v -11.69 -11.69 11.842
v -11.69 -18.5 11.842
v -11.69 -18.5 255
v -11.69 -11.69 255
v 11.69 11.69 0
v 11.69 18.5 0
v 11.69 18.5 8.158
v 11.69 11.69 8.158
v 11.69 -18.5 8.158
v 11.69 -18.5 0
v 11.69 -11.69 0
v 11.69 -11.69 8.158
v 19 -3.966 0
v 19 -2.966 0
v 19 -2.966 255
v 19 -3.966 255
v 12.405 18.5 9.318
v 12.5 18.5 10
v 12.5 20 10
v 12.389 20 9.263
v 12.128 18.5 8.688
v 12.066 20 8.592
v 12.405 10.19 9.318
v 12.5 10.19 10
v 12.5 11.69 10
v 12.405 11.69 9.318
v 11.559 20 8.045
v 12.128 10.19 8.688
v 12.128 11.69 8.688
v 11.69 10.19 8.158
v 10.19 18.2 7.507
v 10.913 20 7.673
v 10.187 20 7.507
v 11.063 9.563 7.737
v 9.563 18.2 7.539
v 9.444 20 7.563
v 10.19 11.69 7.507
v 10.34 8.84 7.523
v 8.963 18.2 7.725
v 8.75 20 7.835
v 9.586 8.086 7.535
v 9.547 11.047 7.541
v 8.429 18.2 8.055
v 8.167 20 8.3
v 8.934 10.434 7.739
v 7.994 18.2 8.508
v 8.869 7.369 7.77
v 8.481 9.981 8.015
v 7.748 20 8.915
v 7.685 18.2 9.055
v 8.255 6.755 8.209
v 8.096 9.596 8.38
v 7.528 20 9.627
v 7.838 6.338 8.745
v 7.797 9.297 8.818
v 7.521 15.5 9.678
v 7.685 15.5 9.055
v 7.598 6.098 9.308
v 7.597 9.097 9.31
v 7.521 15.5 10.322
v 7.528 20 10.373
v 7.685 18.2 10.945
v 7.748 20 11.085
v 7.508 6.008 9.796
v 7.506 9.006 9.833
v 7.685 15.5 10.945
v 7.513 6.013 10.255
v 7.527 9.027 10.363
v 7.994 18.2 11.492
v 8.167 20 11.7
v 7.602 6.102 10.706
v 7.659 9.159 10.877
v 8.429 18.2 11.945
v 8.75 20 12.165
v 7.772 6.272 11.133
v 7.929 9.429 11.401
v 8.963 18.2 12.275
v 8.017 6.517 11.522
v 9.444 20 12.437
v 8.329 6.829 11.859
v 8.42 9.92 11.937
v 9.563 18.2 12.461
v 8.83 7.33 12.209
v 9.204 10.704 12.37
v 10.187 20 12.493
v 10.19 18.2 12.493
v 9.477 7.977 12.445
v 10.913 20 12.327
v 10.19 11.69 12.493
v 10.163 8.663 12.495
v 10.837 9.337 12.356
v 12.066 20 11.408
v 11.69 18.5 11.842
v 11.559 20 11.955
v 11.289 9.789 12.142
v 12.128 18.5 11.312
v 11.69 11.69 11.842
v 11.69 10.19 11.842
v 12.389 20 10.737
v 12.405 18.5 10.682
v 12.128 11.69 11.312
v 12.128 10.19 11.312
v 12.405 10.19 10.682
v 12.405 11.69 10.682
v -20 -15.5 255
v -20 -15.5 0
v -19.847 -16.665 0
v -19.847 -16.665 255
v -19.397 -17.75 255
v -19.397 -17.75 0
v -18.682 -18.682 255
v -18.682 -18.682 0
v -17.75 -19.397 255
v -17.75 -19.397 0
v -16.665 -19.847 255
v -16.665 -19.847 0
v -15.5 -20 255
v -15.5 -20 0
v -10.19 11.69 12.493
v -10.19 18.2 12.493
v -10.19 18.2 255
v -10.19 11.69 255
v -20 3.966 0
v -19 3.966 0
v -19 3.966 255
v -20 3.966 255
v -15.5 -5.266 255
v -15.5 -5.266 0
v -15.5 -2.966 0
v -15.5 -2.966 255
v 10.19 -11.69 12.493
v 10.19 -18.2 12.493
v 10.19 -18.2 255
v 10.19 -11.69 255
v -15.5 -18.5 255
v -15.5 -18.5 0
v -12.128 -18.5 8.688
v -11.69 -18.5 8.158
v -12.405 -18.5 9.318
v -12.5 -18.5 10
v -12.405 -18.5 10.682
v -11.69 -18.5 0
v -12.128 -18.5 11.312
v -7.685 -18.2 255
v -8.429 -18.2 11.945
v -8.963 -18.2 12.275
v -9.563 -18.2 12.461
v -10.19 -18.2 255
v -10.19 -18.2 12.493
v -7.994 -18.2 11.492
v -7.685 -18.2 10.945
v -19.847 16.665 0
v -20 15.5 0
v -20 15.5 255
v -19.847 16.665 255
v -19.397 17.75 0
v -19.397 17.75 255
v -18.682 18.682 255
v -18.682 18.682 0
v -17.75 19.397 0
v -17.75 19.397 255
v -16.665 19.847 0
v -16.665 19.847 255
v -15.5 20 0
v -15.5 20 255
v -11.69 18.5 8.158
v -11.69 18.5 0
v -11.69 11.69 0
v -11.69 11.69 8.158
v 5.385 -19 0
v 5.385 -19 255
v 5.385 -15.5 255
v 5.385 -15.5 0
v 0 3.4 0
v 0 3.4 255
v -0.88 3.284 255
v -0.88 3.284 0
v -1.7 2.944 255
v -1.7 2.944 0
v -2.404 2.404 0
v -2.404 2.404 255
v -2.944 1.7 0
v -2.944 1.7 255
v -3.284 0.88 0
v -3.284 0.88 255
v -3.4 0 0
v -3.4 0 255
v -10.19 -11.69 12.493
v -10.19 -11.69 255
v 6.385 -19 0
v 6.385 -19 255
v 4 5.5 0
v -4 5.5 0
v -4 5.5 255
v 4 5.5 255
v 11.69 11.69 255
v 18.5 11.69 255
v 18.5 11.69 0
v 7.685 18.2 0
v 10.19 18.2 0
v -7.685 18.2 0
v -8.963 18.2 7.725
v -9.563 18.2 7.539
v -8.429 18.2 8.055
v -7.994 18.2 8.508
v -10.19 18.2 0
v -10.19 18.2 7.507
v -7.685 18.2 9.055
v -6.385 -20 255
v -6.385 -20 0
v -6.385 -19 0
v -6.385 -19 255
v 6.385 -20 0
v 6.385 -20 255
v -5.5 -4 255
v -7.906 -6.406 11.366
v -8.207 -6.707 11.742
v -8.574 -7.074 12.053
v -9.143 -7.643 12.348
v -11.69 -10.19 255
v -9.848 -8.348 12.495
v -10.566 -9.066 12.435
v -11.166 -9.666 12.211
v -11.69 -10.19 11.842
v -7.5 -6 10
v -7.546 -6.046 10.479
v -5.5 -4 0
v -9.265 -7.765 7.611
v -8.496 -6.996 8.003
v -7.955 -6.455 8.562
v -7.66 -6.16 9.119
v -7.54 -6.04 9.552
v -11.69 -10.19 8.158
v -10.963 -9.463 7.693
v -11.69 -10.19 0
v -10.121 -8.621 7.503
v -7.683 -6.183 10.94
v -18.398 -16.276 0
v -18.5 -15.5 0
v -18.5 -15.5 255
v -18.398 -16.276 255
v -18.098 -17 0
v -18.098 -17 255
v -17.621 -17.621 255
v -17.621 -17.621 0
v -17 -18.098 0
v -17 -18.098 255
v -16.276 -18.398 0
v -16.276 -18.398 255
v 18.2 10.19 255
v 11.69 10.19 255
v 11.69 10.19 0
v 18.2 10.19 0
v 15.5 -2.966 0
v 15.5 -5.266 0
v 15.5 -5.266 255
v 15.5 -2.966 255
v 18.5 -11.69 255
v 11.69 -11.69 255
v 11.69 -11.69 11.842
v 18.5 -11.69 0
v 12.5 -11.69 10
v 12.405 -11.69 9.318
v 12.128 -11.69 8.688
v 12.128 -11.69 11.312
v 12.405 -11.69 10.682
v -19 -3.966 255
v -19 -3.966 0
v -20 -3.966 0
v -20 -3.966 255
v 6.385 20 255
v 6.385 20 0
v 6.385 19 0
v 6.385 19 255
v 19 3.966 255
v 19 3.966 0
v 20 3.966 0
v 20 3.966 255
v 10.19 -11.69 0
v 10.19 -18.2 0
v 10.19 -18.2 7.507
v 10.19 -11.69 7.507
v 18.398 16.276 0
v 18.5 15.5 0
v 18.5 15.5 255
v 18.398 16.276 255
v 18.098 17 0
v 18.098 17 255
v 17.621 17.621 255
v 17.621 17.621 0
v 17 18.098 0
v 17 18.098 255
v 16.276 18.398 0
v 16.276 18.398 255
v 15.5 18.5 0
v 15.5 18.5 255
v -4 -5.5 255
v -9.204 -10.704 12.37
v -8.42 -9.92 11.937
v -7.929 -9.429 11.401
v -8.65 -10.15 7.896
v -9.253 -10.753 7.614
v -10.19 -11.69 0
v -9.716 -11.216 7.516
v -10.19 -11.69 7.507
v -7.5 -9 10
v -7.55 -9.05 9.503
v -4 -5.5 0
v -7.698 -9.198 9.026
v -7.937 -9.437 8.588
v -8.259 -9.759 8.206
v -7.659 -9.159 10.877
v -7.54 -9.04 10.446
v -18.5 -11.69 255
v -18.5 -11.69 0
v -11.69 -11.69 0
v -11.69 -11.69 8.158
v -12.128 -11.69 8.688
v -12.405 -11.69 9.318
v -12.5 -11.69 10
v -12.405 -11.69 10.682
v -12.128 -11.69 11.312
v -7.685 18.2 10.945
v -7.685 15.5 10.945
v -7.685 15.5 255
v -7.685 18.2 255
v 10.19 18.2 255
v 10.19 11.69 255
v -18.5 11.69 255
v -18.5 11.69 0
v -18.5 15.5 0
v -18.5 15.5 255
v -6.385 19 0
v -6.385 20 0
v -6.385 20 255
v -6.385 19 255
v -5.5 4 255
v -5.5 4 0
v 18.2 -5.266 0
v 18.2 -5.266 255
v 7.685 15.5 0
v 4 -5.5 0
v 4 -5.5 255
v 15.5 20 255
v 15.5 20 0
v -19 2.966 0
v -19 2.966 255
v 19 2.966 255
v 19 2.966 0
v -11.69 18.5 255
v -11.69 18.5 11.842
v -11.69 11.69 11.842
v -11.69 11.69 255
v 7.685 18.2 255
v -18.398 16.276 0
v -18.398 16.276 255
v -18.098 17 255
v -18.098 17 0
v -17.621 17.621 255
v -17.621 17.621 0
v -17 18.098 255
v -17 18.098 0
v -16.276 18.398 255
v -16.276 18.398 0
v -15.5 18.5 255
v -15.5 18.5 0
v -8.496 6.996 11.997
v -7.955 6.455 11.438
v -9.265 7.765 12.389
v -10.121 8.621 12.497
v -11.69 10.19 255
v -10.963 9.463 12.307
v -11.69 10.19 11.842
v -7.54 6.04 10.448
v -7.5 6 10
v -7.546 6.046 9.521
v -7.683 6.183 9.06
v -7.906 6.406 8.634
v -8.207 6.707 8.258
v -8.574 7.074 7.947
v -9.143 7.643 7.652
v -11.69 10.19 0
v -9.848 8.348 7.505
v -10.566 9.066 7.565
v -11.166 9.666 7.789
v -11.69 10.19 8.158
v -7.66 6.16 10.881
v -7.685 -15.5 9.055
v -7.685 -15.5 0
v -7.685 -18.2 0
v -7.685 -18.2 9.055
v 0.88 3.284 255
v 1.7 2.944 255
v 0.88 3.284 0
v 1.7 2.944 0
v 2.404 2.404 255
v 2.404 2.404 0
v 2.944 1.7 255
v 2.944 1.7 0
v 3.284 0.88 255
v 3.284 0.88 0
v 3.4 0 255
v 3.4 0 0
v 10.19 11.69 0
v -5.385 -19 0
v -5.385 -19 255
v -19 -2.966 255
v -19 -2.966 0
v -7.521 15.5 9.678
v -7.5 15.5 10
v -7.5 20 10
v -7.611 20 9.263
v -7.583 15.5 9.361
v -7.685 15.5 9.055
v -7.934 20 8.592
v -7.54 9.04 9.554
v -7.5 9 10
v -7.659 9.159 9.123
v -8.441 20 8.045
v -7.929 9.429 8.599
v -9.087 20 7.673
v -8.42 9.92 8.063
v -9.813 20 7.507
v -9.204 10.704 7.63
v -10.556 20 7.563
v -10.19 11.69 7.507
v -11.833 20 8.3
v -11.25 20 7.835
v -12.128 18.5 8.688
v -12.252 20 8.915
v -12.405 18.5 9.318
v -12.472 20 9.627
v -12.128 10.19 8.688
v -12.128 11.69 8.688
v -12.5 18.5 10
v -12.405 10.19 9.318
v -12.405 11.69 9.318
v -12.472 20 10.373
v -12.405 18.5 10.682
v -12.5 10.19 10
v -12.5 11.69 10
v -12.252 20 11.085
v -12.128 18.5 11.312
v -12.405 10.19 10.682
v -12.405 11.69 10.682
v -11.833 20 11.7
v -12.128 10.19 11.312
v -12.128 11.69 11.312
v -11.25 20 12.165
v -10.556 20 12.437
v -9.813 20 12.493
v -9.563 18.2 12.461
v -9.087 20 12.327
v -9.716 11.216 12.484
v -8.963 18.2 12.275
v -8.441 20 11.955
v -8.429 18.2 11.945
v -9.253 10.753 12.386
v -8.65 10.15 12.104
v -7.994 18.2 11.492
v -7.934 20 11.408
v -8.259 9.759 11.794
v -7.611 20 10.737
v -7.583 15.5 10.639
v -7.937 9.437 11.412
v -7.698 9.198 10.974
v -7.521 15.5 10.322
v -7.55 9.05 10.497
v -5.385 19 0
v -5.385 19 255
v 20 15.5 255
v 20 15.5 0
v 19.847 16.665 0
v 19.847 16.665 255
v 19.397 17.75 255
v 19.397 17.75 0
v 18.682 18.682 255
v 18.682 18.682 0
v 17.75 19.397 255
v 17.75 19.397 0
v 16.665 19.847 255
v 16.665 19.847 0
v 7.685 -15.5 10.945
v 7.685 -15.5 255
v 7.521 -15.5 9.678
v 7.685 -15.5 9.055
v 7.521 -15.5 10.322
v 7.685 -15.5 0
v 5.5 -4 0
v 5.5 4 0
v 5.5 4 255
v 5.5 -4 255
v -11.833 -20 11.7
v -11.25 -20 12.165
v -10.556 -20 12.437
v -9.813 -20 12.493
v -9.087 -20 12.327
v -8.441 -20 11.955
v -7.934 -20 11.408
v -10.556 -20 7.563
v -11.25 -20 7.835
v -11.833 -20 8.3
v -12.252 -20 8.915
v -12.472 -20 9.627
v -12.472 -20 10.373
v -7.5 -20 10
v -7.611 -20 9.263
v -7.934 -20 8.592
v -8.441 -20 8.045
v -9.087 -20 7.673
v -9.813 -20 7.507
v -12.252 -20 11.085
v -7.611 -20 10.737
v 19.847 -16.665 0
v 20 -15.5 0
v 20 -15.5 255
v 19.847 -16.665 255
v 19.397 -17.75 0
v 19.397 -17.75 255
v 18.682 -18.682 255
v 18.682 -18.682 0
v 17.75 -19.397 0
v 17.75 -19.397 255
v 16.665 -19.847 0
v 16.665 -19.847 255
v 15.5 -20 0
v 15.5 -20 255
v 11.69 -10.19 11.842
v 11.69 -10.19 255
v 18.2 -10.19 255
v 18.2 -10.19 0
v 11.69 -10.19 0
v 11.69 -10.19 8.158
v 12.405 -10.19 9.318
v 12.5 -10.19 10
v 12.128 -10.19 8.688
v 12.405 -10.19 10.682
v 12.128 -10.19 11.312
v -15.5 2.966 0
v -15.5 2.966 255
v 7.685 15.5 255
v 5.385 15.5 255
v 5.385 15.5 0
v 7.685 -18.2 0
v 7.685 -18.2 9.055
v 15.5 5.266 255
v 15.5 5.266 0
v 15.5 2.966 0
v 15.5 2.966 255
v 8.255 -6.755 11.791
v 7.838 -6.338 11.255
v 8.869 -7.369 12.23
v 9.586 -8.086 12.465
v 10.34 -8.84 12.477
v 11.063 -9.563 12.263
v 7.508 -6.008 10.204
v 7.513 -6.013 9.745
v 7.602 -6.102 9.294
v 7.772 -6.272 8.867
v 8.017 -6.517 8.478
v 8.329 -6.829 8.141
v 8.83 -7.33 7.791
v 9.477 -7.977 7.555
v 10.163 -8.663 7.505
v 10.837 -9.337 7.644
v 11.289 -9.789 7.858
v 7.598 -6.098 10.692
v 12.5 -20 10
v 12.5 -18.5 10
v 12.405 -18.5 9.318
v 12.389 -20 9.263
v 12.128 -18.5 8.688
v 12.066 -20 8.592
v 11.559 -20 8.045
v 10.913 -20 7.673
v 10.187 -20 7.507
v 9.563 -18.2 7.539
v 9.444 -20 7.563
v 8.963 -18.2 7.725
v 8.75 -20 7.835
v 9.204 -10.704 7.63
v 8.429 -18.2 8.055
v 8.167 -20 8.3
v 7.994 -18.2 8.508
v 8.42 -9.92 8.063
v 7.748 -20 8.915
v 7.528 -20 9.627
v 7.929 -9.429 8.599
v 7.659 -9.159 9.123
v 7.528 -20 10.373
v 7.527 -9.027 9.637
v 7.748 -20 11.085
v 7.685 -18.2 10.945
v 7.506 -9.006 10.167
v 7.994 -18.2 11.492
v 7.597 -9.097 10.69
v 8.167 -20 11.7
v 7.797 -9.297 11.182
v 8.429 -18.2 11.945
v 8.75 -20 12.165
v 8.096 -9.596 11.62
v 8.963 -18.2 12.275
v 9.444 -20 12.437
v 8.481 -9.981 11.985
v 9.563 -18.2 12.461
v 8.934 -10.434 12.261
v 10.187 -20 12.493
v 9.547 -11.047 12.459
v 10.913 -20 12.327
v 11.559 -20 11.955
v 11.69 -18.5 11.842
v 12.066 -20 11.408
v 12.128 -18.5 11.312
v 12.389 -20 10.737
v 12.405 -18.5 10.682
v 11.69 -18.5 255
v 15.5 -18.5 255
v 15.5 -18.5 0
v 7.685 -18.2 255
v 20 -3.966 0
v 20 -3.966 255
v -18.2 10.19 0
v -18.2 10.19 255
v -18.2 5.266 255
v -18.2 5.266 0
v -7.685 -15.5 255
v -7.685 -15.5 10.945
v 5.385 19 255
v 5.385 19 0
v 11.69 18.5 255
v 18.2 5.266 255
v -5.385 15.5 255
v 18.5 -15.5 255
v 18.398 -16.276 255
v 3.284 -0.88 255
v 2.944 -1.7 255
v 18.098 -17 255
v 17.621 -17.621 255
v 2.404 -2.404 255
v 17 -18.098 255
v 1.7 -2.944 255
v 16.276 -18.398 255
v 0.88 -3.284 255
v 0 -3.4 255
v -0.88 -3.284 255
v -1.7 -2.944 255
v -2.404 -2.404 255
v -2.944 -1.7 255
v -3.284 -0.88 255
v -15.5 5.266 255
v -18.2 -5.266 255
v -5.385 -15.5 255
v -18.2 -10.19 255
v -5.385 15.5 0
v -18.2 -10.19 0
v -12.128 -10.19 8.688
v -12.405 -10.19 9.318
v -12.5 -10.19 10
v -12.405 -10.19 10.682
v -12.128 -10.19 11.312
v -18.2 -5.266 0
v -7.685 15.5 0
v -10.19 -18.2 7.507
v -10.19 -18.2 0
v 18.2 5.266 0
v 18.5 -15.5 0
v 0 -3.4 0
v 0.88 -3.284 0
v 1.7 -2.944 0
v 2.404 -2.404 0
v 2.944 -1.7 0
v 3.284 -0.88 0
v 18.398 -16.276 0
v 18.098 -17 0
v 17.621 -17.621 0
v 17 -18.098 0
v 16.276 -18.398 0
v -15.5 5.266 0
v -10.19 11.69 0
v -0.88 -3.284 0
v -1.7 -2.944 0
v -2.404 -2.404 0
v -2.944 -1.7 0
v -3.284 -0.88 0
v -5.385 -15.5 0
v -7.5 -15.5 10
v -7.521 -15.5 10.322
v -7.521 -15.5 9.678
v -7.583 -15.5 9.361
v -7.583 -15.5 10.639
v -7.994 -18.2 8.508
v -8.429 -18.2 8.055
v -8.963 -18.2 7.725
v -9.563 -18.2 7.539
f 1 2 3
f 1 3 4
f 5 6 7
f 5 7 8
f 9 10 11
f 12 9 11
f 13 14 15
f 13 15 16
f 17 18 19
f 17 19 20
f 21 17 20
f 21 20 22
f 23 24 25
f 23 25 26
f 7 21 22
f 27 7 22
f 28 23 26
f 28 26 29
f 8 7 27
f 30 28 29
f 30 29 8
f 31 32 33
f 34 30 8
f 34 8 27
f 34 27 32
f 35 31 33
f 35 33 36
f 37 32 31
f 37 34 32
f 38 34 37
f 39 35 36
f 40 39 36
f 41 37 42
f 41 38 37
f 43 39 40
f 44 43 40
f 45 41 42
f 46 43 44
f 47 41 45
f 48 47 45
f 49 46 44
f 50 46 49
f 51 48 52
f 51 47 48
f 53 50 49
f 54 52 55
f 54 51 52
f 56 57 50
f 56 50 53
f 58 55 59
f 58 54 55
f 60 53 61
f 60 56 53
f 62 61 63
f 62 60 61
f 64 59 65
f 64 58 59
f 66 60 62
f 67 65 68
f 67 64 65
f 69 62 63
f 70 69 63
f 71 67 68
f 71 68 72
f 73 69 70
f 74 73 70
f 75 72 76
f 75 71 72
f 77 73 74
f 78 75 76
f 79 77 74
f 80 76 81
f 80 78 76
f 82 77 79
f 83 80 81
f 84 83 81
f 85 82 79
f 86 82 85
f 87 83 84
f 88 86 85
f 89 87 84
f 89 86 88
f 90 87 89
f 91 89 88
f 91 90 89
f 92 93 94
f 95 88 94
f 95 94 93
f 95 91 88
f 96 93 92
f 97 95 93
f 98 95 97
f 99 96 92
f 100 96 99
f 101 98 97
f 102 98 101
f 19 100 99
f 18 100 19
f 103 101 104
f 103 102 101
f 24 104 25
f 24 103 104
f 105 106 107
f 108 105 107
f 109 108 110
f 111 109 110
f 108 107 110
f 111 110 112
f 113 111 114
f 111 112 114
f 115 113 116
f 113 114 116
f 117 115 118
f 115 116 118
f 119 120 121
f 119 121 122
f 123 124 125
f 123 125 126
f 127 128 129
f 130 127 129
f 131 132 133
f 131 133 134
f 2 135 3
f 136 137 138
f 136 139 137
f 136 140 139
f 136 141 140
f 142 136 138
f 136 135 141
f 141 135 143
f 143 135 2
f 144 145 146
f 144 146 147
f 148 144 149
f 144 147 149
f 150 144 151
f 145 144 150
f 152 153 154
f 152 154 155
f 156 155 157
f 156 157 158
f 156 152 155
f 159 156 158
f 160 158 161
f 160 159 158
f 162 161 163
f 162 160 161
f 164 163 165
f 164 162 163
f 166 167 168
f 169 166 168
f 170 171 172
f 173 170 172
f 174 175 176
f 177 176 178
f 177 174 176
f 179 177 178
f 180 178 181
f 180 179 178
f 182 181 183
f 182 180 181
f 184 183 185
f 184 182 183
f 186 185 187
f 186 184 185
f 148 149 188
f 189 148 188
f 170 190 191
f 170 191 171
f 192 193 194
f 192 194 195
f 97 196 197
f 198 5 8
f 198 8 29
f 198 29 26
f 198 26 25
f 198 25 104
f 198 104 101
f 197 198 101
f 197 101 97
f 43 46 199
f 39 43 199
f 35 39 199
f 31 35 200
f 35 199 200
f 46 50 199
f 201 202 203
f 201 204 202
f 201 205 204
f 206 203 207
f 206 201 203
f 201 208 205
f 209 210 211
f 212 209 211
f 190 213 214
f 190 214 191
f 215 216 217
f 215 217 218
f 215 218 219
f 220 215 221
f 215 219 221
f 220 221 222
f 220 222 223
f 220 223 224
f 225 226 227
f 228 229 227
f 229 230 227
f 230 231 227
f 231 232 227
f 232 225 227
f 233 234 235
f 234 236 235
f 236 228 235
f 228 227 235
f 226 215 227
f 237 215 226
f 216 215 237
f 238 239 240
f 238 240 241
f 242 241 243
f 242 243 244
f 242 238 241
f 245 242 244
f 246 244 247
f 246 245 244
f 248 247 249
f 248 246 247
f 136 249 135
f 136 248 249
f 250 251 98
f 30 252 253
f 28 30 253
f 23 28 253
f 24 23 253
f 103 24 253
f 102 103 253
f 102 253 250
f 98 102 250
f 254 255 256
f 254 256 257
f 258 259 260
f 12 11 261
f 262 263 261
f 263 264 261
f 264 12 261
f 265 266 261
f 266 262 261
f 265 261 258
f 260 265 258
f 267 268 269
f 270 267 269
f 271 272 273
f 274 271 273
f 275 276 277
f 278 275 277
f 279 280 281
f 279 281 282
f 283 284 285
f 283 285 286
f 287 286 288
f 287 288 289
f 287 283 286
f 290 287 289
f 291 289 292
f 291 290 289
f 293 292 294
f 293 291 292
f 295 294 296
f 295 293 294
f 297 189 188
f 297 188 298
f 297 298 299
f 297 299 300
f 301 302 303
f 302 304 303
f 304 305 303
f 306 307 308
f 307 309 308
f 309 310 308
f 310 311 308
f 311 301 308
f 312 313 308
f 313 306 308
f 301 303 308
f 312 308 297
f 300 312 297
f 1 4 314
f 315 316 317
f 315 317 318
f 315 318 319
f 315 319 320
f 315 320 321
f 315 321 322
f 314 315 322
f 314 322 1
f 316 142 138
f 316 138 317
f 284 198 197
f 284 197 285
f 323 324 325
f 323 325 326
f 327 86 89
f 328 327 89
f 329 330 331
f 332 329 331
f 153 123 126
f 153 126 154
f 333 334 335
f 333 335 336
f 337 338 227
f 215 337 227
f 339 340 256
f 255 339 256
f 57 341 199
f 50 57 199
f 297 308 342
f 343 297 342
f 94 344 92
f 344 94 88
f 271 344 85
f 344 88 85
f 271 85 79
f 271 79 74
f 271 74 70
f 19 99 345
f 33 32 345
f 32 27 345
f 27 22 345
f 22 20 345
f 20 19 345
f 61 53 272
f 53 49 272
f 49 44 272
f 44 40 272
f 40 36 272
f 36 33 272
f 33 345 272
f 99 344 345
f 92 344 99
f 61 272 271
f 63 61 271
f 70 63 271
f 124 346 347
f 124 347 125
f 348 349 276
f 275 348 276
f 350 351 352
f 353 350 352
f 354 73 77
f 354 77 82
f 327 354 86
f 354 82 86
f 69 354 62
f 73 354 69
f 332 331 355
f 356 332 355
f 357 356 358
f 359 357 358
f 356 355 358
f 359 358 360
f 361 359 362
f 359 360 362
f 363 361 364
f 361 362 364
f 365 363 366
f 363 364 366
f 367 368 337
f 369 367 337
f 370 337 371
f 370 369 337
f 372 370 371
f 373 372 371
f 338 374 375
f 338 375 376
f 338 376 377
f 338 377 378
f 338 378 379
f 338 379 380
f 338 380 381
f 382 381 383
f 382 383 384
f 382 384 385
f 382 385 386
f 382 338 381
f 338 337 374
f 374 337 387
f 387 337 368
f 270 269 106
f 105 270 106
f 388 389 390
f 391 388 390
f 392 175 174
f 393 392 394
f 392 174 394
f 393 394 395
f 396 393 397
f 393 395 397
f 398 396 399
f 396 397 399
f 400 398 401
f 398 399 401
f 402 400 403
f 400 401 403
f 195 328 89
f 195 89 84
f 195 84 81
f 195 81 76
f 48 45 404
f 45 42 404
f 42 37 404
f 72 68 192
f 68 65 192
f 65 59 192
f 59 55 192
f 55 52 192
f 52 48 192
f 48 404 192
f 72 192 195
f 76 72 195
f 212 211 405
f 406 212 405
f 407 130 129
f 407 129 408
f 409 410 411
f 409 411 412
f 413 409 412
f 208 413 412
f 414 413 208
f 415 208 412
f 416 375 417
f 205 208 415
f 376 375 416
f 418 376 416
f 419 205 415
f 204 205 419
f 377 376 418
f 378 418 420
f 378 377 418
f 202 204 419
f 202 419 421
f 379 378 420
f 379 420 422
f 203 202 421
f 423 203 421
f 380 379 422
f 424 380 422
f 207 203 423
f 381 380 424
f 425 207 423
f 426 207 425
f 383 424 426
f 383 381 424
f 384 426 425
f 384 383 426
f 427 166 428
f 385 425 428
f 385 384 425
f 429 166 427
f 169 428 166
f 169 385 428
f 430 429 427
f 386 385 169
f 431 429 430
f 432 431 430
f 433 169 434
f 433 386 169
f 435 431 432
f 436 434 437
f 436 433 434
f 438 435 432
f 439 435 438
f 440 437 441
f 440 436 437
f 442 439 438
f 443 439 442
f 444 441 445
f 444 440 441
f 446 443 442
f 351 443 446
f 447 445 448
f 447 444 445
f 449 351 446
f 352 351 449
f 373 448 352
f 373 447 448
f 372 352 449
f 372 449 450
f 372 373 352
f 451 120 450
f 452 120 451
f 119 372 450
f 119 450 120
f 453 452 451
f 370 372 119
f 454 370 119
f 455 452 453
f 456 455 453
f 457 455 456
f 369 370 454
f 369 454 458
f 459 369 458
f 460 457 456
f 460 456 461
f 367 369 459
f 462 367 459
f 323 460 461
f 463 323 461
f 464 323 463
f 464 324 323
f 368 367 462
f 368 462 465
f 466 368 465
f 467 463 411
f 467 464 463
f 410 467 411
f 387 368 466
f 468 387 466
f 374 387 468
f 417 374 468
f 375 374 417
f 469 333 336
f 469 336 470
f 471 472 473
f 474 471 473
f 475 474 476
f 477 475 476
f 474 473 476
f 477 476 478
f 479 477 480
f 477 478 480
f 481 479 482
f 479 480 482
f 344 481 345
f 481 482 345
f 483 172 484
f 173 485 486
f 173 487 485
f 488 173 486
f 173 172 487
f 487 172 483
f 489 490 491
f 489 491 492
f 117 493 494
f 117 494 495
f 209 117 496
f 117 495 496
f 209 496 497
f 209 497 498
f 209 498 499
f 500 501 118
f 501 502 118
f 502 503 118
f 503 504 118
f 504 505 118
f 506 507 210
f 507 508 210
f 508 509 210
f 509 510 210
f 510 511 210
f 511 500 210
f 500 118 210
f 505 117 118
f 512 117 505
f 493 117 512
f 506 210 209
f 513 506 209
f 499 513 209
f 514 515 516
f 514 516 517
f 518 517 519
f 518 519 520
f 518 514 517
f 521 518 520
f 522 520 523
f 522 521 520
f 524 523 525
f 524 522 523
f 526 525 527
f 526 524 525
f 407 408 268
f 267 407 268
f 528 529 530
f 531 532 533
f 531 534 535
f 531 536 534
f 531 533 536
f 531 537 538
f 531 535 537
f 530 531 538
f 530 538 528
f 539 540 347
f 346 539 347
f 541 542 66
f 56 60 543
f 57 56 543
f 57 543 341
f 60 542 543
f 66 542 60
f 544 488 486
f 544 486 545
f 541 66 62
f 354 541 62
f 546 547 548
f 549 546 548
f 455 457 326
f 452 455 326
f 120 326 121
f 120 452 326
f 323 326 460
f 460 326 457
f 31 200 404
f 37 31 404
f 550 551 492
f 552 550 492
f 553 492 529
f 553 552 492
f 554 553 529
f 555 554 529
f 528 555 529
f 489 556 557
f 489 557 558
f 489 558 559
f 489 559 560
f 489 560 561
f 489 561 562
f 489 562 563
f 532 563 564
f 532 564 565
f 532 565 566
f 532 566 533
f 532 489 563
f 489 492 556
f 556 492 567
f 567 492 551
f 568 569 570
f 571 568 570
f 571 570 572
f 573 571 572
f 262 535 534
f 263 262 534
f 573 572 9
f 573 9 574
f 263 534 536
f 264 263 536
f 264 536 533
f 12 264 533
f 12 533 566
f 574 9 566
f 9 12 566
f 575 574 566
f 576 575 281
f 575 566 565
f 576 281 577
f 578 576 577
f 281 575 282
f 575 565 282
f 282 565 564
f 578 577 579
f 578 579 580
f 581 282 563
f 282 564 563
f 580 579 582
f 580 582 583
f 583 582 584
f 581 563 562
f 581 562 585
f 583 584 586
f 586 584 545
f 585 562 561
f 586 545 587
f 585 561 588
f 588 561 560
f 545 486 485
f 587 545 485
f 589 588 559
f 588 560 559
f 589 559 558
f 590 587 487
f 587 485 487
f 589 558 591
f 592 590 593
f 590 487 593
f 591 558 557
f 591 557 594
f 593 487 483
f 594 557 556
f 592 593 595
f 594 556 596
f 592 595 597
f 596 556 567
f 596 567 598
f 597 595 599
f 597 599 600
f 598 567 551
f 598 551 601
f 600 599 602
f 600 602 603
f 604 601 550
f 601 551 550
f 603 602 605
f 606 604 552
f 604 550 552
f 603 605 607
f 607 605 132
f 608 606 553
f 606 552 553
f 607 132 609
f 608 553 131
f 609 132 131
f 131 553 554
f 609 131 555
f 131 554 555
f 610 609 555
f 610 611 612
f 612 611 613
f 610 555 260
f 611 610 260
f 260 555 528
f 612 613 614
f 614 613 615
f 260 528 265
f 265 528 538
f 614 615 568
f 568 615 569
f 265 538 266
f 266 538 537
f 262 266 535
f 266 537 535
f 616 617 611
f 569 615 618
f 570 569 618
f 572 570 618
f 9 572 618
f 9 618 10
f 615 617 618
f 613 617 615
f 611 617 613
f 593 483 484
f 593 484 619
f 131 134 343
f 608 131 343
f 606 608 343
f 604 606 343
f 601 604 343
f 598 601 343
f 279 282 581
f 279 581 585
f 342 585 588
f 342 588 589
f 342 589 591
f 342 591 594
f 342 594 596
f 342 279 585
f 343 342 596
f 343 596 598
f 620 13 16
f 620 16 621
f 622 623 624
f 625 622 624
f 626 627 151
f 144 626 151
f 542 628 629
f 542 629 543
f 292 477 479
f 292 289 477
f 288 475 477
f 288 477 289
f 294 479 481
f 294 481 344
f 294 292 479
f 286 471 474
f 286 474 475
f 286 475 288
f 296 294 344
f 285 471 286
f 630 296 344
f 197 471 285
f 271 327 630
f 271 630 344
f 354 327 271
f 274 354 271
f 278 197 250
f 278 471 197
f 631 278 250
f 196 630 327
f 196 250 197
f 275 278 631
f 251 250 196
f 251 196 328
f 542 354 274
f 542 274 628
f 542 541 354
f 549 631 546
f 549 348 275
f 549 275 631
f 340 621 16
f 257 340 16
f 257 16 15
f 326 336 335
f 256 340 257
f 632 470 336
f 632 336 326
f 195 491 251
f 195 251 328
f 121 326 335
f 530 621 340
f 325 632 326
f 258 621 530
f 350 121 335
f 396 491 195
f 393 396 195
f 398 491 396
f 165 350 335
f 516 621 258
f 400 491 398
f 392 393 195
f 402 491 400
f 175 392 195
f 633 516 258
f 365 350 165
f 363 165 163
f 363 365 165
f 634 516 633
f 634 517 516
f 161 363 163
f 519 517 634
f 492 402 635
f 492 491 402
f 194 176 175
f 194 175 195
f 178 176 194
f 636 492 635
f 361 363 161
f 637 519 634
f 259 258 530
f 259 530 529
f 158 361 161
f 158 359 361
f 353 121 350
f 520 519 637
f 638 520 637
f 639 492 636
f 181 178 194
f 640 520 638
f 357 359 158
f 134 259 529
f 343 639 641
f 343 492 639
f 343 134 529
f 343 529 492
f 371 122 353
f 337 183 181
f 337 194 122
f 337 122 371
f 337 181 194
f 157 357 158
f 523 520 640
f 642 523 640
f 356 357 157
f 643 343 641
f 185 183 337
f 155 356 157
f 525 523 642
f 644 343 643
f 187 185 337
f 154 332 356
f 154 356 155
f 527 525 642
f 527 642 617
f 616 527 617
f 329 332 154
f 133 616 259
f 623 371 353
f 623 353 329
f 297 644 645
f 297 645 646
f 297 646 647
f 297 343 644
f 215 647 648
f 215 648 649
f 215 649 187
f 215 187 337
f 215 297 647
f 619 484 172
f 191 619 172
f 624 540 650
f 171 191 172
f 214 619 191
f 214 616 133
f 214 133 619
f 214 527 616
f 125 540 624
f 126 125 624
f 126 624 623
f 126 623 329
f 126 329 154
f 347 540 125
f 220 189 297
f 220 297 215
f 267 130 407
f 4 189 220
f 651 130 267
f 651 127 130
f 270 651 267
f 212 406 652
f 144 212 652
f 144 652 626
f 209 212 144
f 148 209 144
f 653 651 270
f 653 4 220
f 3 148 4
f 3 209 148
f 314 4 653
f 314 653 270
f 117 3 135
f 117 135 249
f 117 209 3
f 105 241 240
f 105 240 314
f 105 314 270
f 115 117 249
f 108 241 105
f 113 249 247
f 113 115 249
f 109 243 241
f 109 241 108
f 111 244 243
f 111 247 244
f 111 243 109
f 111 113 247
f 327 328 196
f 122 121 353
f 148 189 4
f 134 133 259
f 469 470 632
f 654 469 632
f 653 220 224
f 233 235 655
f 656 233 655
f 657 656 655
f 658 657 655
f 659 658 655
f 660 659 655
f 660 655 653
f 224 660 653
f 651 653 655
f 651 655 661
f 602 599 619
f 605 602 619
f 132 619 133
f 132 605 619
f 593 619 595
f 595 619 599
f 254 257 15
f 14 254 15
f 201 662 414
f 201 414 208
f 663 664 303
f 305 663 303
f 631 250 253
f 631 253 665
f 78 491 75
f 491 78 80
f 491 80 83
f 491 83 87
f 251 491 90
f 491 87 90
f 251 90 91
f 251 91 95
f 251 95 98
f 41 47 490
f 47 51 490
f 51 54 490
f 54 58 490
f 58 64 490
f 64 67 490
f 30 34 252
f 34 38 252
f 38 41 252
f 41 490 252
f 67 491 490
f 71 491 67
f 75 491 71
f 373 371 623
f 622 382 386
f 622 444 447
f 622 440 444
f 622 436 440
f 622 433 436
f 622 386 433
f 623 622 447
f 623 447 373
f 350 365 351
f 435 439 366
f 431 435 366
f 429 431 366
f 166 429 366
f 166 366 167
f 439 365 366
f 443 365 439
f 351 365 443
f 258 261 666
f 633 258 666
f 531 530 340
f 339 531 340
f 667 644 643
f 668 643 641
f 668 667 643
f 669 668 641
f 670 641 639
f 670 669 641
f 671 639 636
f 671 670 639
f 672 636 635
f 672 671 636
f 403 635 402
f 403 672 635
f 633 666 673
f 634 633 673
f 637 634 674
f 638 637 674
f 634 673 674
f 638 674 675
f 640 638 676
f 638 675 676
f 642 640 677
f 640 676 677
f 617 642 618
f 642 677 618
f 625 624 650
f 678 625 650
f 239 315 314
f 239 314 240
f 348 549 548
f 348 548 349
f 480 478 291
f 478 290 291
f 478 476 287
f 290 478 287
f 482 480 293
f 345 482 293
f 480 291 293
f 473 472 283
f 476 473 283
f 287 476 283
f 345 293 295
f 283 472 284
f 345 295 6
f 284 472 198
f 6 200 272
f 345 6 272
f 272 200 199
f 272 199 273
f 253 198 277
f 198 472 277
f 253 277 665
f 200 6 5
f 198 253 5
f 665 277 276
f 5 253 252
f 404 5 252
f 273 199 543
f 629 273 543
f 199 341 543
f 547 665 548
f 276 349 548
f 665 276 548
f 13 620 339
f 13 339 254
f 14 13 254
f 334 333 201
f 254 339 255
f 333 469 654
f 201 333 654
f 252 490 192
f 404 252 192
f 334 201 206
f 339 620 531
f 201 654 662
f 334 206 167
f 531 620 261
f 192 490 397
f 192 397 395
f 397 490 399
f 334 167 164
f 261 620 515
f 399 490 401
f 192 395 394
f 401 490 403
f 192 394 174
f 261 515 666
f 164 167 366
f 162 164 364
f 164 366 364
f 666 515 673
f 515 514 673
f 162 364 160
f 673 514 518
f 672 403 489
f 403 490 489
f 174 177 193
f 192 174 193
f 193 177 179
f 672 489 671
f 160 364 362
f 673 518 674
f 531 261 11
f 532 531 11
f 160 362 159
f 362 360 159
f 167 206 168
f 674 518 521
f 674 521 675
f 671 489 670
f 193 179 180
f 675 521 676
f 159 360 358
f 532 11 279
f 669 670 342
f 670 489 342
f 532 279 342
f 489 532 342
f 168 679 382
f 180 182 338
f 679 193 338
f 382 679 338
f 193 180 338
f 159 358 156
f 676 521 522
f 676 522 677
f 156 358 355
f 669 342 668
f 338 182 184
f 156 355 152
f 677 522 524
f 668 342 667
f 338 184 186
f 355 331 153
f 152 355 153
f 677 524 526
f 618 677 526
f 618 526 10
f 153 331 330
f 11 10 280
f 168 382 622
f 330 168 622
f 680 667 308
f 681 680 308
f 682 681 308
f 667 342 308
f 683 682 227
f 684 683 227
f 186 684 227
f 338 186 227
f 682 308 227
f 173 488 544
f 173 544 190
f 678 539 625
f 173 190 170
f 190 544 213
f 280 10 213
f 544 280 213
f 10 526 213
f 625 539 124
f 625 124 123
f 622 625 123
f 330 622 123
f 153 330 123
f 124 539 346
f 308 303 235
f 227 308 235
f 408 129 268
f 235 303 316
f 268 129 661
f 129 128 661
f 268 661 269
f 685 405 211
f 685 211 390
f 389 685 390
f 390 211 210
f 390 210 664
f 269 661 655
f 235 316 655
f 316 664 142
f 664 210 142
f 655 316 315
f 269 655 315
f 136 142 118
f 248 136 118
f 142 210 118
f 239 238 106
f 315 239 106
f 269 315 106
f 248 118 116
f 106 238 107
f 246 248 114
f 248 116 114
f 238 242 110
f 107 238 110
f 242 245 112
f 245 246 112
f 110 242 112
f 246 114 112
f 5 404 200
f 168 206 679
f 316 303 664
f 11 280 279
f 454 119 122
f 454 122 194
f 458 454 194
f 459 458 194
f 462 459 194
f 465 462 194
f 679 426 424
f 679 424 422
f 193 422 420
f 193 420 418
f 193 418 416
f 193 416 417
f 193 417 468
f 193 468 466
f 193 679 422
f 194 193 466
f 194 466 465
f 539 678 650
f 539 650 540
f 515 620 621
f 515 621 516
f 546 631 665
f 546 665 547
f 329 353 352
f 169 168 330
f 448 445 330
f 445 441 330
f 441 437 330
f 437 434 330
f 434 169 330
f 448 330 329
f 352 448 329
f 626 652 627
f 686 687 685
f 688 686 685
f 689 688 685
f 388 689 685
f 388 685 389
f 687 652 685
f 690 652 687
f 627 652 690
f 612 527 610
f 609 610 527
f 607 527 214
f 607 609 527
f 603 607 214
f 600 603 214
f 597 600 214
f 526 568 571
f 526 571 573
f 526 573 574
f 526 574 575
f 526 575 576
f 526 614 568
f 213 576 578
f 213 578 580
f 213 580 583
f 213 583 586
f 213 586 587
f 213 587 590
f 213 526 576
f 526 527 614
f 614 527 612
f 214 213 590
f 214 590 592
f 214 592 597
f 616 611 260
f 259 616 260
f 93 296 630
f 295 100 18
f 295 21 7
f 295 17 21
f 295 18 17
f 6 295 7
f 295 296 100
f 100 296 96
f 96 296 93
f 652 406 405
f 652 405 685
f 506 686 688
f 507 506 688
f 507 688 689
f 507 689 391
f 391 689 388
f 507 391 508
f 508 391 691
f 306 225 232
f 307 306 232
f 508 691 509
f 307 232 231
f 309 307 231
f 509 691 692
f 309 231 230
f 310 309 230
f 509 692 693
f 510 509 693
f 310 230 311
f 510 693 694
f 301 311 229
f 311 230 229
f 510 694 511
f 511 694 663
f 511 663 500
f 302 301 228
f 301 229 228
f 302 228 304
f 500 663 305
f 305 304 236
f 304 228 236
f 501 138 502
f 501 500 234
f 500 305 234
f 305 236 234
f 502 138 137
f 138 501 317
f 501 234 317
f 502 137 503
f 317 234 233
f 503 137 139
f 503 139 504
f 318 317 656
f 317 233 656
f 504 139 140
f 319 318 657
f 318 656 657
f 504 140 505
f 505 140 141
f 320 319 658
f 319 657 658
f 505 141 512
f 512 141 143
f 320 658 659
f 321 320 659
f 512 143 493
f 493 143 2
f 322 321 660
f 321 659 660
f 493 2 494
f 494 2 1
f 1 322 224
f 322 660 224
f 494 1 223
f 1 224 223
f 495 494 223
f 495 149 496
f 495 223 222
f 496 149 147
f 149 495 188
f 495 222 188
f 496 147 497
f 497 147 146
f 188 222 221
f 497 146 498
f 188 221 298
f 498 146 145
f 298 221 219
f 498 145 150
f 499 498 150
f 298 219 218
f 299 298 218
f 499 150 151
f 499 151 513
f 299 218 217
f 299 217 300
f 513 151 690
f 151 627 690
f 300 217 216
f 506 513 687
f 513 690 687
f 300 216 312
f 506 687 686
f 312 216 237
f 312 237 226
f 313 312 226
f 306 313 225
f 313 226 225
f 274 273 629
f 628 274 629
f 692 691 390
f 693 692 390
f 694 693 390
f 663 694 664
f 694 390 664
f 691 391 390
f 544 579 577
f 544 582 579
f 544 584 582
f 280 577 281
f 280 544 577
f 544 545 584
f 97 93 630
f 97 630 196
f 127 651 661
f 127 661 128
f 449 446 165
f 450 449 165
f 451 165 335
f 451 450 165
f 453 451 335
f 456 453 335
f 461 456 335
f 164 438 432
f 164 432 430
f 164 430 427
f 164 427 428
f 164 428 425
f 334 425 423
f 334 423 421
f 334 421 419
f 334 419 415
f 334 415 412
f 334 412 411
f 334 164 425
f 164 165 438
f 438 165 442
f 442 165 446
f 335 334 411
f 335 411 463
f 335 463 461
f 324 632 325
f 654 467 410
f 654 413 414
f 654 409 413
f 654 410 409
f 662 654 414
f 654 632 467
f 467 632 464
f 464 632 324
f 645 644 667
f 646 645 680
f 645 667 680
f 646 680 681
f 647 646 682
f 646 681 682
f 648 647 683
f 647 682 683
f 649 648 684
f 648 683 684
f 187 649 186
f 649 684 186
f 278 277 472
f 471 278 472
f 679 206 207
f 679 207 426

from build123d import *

# Parameters (mm, degrees)
BOSS_EXTRUDE1_DEPTH     = 255
MIRROR3_COPY_1_DEPTH    = 255
MIRROR3_COPY_2_DEPTH    = 255
SKETCH2_R               = 2.5
CUT_EXTRUDE1_DEPTH      = 15.5
CUT_EXTRUDE1_DEPTH_BACK = 26.5


with BuildPart() as part:
    # Sketch1 → Boss-Extrude1 (new body)
    with BuildSketch(Plane.XY):
        with BuildLine():
            Line((3.4, 0), (5.5, 0))
            Line((5.5, 0), (5.5, 4))
            Line((5.5, 4), (11.69, 10.19))
            Line((11.69, 10.19), (18.2, 10.19))
            Line((18.2, 10.19), (18.2, 5.265595036))
            Line((18.2, 5.265595036), (15.5, 5.265595036))
            Line((15.5, 5.265595036), (15.5, 2.965595036))
            Line((15.5, 2.965595036), (19, 2.965595036))
            Line((19, 2.965595036), (19, 3.965595036))
            Line((19, 3.965595036), (20, 3.965595036))
            Line((20, 3.965595036), (20, 15.5))
            ThreePointArc((20, 15.5), (18.681980515, 18.681980515), (15.5, 20))
            Line((15.5, 20), (6.385304712, 20))
            Line((6.385304712, 20), (6.385304712, 19))
            Line((6.385304712, 19), (5.385304712, 19))
            Line((5.385304712, 19), (5.385304712, 15.5))
            Line((5.385304712, 15.5), (7.685304712, 15.5))
            Line((7.685304712, 15.5), (7.685304712, 18.2))
            Line((7.685304712, 18.2), (10.19, 18.2))
            Line((10.19, 18.2), (10.19, 11.69))
            Line((10.19, 11.69), (4, 5.5))
            Line((4, 5.5), (0, 5.5))
            Line((0, 5.5), (0, 3.4))
            ThreePointArc((0, 3.4), (2.404163056, 2.404163056), (3.4, 0))
        make_face()
        with BuildLine():
            Line((18.5, 11.69), (18.5, 15.5))
            ThreePointArc((18.5, 15.5), (17.621320344, 17.621320344), (15.5, 18.5))
            Line((15.5, 18.5), (11.69, 18.5))
            Line((11.69, 18.5), (11.69, 11.69))
            Line((11.69, 11.69), (18.5, 11.69))
        make_face(mode=Mode.SUBTRACT)
    boss_extrude1 = extrude(amount=BOSS_EXTRUDE1_DEPTH)

    # Mirror1: Boss-Extrude1 across plane
    add(boss_extrude1.mirror(Plane.ZX))

    # Mirror2: Boss-Extrude1 across plane
    add(boss_extrude1.mirror(Plane(origin=(0, 0, 0), x_dir=(0, 0, 1), z_dir=(1, 0, 0))))

    # Mirror3 copy 1 sketch → Mirror3 copy 1 (add)
    with BuildSketch(Plane(origin=(0, 0, 0), x_dir=(-1, 0, 0), z_dir=(0, 0, 1))):
        with BuildLine():
            Line((3.4, 0), (5.5, 0))
            Line((5.5, 0), (5.5, 4))
            Line((5.5, 4), (11.69, 10.19))
            Line((11.69, 10.19), (18.2, 10.19))
            Line((18.2, 10.19), (18.2, 5.265595036))
            Line((18.2, 5.265595036), (15.5, 5.265595036))
            Line((15.5, 5.265595036), (15.5, 2.965595036))
            Line((15.5, 2.965595036), (19, 2.965595036))
            Line((19, 2.965595036), (19, 3.965595036))
            Line((19, 3.965595036), (20, 3.965595036))
            Line((20, 3.965595036), (20, 15.5))
            ThreePointArc((20, 15.5), (18.681980515, 18.681980515), (15.5, 20))
            Line((15.5, 20), (6.385304712, 20))
            Line((6.385304712, 20), (6.385304712, 19))
            Line((6.385304712, 19), (5.385304712, 19))
            Line((5.385304712, 19), (5.385304712, 15.5))
            Line((5.385304712, 15.5), (7.685304712, 15.5))
            Line((7.685304712, 15.5), (7.685304712, 18.2))
            Line((7.685304712, 18.2), (10.19, 18.2))
            Line((10.19, 18.2), (10.19, 11.69))
            Line((10.19, 11.69), (4, 5.5))
            Line((4, 5.5), (0, 5.5))
            Line((0, 5.5), (0, 3.4))
            ThreePointArc((0, 3.4), (2.404163056, 2.404163056), (3.4, 0))
        make_face()
        with BuildLine():
            Line((18.5, 11.69), (18.5, 15.5))
            ThreePointArc((18.5, 15.5), (17.621320344, 17.621320344), (15.5, 18.5))
            Line((15.5, 18.5), (11.69, 18.5))
            Line((11.69, 18.5), (11.69, 11.69))
            Line((11.69, 11.69), (18.5, 11.69))
        make_face(mode=Mode.SUBTRACT)
    extrude(amount=MIRROR3_COPY_1_DEPTH)

    # Mirror3 copy 2 sketch → Mirror3 copy 2 (add)
    with BuildSketch(Plane.XY):
        with BuildLine():
            Line((3.4, 0), (5.5, 0))
            Line((5.5, 0), (5.5, -4))
            Line((5.5, -4), (11.69, -10.19))
            Line((11.69, -10.19), (18.2, -10.19))
            Line((18.2, -10.19), (18.2, -5.265595036))
            Line((18.2, -5.265595036), (15.5, -5.265595036))
            Line((15.5, -5.265595036), (15.5, -2.965595036))
            Line((15.5, -2.965595036), (19, -2.965595036))
            Line((19, -2.965595036), (19, -3.965595036))
            Line((19, -3.965595036), (20, -3.965595036))
            Line((20, -3.965595036), (20, -15.5))
            ThreePointArc((20, -15.5), (18.681980515, -18.681980515), (15.5, -20))
            Line((15.5, -20), (6.385304712, -20))
            Line((6.385304712, -20), (6.385304712, -19))
            Line((6.385304712, -19), (5.385304712, -19))
            Line((5.385304712, -19), (5.385304712, -15.5))
            Line((5.385304712, -15.5), (7.685304712, -15.5))
            Line((7.685304712, -15.5), (7.685304712, -18.2))
            Line((7.685304712, -18.2), (10.19, -18.2))
            Line((10.19, -18.2), (10.19, -11.69))
            Line((10.19, -11.69), (4, -5.5))
            Line((4, -5.5), (0, -5.5))
            Line((0, -5.5), (0, -3.4))
            ThreePointArc((0, -3.4), (2.404163056, -2.404163056), (3.4, 0))
        make_face()
        with BuildLine():
            Line((18.5, -11.69), (18.5, -15.5))
            ThreePointArc((18.5, -15.5), (17.621320344, -17.621320344), (15.5, -18.5))
            Line((15.5, -18.5), (11.69, -18.5))
            Line((11.69, -18.5), (11.69, -11.69))
            Line((11.69, -11.69), (18.5, -11.69))
        make_face(mode=Mode.SUBTRACT)
    extrude(amount=MIRROR3_COPY_2_DEPTH)

    # Sketch2 → Cut-Extrude1 (cut, two sides)
    with BuildSketch(Plane(origin=(0, 5.5, 0), x_dir=(1, 0, 0), z_dir=(0, 1, 0))) as cut_extrude1_sk:
        with Locations((-10, -10)):
            Circle(SKETCH2_R)
        with Locations((10, -10)):
            Circle(SKETCH2_R)
    extrude(amount=CUT_EXTRUDE1_DEPTH, mode=Mode.SUBTRACT)
    extrude(cut_extrude1_sk.sketch, amount=-CUT_EXTRUDE1_DEPTH_BACK, mode=Mode.SUBTRACT)


solid = part.part
